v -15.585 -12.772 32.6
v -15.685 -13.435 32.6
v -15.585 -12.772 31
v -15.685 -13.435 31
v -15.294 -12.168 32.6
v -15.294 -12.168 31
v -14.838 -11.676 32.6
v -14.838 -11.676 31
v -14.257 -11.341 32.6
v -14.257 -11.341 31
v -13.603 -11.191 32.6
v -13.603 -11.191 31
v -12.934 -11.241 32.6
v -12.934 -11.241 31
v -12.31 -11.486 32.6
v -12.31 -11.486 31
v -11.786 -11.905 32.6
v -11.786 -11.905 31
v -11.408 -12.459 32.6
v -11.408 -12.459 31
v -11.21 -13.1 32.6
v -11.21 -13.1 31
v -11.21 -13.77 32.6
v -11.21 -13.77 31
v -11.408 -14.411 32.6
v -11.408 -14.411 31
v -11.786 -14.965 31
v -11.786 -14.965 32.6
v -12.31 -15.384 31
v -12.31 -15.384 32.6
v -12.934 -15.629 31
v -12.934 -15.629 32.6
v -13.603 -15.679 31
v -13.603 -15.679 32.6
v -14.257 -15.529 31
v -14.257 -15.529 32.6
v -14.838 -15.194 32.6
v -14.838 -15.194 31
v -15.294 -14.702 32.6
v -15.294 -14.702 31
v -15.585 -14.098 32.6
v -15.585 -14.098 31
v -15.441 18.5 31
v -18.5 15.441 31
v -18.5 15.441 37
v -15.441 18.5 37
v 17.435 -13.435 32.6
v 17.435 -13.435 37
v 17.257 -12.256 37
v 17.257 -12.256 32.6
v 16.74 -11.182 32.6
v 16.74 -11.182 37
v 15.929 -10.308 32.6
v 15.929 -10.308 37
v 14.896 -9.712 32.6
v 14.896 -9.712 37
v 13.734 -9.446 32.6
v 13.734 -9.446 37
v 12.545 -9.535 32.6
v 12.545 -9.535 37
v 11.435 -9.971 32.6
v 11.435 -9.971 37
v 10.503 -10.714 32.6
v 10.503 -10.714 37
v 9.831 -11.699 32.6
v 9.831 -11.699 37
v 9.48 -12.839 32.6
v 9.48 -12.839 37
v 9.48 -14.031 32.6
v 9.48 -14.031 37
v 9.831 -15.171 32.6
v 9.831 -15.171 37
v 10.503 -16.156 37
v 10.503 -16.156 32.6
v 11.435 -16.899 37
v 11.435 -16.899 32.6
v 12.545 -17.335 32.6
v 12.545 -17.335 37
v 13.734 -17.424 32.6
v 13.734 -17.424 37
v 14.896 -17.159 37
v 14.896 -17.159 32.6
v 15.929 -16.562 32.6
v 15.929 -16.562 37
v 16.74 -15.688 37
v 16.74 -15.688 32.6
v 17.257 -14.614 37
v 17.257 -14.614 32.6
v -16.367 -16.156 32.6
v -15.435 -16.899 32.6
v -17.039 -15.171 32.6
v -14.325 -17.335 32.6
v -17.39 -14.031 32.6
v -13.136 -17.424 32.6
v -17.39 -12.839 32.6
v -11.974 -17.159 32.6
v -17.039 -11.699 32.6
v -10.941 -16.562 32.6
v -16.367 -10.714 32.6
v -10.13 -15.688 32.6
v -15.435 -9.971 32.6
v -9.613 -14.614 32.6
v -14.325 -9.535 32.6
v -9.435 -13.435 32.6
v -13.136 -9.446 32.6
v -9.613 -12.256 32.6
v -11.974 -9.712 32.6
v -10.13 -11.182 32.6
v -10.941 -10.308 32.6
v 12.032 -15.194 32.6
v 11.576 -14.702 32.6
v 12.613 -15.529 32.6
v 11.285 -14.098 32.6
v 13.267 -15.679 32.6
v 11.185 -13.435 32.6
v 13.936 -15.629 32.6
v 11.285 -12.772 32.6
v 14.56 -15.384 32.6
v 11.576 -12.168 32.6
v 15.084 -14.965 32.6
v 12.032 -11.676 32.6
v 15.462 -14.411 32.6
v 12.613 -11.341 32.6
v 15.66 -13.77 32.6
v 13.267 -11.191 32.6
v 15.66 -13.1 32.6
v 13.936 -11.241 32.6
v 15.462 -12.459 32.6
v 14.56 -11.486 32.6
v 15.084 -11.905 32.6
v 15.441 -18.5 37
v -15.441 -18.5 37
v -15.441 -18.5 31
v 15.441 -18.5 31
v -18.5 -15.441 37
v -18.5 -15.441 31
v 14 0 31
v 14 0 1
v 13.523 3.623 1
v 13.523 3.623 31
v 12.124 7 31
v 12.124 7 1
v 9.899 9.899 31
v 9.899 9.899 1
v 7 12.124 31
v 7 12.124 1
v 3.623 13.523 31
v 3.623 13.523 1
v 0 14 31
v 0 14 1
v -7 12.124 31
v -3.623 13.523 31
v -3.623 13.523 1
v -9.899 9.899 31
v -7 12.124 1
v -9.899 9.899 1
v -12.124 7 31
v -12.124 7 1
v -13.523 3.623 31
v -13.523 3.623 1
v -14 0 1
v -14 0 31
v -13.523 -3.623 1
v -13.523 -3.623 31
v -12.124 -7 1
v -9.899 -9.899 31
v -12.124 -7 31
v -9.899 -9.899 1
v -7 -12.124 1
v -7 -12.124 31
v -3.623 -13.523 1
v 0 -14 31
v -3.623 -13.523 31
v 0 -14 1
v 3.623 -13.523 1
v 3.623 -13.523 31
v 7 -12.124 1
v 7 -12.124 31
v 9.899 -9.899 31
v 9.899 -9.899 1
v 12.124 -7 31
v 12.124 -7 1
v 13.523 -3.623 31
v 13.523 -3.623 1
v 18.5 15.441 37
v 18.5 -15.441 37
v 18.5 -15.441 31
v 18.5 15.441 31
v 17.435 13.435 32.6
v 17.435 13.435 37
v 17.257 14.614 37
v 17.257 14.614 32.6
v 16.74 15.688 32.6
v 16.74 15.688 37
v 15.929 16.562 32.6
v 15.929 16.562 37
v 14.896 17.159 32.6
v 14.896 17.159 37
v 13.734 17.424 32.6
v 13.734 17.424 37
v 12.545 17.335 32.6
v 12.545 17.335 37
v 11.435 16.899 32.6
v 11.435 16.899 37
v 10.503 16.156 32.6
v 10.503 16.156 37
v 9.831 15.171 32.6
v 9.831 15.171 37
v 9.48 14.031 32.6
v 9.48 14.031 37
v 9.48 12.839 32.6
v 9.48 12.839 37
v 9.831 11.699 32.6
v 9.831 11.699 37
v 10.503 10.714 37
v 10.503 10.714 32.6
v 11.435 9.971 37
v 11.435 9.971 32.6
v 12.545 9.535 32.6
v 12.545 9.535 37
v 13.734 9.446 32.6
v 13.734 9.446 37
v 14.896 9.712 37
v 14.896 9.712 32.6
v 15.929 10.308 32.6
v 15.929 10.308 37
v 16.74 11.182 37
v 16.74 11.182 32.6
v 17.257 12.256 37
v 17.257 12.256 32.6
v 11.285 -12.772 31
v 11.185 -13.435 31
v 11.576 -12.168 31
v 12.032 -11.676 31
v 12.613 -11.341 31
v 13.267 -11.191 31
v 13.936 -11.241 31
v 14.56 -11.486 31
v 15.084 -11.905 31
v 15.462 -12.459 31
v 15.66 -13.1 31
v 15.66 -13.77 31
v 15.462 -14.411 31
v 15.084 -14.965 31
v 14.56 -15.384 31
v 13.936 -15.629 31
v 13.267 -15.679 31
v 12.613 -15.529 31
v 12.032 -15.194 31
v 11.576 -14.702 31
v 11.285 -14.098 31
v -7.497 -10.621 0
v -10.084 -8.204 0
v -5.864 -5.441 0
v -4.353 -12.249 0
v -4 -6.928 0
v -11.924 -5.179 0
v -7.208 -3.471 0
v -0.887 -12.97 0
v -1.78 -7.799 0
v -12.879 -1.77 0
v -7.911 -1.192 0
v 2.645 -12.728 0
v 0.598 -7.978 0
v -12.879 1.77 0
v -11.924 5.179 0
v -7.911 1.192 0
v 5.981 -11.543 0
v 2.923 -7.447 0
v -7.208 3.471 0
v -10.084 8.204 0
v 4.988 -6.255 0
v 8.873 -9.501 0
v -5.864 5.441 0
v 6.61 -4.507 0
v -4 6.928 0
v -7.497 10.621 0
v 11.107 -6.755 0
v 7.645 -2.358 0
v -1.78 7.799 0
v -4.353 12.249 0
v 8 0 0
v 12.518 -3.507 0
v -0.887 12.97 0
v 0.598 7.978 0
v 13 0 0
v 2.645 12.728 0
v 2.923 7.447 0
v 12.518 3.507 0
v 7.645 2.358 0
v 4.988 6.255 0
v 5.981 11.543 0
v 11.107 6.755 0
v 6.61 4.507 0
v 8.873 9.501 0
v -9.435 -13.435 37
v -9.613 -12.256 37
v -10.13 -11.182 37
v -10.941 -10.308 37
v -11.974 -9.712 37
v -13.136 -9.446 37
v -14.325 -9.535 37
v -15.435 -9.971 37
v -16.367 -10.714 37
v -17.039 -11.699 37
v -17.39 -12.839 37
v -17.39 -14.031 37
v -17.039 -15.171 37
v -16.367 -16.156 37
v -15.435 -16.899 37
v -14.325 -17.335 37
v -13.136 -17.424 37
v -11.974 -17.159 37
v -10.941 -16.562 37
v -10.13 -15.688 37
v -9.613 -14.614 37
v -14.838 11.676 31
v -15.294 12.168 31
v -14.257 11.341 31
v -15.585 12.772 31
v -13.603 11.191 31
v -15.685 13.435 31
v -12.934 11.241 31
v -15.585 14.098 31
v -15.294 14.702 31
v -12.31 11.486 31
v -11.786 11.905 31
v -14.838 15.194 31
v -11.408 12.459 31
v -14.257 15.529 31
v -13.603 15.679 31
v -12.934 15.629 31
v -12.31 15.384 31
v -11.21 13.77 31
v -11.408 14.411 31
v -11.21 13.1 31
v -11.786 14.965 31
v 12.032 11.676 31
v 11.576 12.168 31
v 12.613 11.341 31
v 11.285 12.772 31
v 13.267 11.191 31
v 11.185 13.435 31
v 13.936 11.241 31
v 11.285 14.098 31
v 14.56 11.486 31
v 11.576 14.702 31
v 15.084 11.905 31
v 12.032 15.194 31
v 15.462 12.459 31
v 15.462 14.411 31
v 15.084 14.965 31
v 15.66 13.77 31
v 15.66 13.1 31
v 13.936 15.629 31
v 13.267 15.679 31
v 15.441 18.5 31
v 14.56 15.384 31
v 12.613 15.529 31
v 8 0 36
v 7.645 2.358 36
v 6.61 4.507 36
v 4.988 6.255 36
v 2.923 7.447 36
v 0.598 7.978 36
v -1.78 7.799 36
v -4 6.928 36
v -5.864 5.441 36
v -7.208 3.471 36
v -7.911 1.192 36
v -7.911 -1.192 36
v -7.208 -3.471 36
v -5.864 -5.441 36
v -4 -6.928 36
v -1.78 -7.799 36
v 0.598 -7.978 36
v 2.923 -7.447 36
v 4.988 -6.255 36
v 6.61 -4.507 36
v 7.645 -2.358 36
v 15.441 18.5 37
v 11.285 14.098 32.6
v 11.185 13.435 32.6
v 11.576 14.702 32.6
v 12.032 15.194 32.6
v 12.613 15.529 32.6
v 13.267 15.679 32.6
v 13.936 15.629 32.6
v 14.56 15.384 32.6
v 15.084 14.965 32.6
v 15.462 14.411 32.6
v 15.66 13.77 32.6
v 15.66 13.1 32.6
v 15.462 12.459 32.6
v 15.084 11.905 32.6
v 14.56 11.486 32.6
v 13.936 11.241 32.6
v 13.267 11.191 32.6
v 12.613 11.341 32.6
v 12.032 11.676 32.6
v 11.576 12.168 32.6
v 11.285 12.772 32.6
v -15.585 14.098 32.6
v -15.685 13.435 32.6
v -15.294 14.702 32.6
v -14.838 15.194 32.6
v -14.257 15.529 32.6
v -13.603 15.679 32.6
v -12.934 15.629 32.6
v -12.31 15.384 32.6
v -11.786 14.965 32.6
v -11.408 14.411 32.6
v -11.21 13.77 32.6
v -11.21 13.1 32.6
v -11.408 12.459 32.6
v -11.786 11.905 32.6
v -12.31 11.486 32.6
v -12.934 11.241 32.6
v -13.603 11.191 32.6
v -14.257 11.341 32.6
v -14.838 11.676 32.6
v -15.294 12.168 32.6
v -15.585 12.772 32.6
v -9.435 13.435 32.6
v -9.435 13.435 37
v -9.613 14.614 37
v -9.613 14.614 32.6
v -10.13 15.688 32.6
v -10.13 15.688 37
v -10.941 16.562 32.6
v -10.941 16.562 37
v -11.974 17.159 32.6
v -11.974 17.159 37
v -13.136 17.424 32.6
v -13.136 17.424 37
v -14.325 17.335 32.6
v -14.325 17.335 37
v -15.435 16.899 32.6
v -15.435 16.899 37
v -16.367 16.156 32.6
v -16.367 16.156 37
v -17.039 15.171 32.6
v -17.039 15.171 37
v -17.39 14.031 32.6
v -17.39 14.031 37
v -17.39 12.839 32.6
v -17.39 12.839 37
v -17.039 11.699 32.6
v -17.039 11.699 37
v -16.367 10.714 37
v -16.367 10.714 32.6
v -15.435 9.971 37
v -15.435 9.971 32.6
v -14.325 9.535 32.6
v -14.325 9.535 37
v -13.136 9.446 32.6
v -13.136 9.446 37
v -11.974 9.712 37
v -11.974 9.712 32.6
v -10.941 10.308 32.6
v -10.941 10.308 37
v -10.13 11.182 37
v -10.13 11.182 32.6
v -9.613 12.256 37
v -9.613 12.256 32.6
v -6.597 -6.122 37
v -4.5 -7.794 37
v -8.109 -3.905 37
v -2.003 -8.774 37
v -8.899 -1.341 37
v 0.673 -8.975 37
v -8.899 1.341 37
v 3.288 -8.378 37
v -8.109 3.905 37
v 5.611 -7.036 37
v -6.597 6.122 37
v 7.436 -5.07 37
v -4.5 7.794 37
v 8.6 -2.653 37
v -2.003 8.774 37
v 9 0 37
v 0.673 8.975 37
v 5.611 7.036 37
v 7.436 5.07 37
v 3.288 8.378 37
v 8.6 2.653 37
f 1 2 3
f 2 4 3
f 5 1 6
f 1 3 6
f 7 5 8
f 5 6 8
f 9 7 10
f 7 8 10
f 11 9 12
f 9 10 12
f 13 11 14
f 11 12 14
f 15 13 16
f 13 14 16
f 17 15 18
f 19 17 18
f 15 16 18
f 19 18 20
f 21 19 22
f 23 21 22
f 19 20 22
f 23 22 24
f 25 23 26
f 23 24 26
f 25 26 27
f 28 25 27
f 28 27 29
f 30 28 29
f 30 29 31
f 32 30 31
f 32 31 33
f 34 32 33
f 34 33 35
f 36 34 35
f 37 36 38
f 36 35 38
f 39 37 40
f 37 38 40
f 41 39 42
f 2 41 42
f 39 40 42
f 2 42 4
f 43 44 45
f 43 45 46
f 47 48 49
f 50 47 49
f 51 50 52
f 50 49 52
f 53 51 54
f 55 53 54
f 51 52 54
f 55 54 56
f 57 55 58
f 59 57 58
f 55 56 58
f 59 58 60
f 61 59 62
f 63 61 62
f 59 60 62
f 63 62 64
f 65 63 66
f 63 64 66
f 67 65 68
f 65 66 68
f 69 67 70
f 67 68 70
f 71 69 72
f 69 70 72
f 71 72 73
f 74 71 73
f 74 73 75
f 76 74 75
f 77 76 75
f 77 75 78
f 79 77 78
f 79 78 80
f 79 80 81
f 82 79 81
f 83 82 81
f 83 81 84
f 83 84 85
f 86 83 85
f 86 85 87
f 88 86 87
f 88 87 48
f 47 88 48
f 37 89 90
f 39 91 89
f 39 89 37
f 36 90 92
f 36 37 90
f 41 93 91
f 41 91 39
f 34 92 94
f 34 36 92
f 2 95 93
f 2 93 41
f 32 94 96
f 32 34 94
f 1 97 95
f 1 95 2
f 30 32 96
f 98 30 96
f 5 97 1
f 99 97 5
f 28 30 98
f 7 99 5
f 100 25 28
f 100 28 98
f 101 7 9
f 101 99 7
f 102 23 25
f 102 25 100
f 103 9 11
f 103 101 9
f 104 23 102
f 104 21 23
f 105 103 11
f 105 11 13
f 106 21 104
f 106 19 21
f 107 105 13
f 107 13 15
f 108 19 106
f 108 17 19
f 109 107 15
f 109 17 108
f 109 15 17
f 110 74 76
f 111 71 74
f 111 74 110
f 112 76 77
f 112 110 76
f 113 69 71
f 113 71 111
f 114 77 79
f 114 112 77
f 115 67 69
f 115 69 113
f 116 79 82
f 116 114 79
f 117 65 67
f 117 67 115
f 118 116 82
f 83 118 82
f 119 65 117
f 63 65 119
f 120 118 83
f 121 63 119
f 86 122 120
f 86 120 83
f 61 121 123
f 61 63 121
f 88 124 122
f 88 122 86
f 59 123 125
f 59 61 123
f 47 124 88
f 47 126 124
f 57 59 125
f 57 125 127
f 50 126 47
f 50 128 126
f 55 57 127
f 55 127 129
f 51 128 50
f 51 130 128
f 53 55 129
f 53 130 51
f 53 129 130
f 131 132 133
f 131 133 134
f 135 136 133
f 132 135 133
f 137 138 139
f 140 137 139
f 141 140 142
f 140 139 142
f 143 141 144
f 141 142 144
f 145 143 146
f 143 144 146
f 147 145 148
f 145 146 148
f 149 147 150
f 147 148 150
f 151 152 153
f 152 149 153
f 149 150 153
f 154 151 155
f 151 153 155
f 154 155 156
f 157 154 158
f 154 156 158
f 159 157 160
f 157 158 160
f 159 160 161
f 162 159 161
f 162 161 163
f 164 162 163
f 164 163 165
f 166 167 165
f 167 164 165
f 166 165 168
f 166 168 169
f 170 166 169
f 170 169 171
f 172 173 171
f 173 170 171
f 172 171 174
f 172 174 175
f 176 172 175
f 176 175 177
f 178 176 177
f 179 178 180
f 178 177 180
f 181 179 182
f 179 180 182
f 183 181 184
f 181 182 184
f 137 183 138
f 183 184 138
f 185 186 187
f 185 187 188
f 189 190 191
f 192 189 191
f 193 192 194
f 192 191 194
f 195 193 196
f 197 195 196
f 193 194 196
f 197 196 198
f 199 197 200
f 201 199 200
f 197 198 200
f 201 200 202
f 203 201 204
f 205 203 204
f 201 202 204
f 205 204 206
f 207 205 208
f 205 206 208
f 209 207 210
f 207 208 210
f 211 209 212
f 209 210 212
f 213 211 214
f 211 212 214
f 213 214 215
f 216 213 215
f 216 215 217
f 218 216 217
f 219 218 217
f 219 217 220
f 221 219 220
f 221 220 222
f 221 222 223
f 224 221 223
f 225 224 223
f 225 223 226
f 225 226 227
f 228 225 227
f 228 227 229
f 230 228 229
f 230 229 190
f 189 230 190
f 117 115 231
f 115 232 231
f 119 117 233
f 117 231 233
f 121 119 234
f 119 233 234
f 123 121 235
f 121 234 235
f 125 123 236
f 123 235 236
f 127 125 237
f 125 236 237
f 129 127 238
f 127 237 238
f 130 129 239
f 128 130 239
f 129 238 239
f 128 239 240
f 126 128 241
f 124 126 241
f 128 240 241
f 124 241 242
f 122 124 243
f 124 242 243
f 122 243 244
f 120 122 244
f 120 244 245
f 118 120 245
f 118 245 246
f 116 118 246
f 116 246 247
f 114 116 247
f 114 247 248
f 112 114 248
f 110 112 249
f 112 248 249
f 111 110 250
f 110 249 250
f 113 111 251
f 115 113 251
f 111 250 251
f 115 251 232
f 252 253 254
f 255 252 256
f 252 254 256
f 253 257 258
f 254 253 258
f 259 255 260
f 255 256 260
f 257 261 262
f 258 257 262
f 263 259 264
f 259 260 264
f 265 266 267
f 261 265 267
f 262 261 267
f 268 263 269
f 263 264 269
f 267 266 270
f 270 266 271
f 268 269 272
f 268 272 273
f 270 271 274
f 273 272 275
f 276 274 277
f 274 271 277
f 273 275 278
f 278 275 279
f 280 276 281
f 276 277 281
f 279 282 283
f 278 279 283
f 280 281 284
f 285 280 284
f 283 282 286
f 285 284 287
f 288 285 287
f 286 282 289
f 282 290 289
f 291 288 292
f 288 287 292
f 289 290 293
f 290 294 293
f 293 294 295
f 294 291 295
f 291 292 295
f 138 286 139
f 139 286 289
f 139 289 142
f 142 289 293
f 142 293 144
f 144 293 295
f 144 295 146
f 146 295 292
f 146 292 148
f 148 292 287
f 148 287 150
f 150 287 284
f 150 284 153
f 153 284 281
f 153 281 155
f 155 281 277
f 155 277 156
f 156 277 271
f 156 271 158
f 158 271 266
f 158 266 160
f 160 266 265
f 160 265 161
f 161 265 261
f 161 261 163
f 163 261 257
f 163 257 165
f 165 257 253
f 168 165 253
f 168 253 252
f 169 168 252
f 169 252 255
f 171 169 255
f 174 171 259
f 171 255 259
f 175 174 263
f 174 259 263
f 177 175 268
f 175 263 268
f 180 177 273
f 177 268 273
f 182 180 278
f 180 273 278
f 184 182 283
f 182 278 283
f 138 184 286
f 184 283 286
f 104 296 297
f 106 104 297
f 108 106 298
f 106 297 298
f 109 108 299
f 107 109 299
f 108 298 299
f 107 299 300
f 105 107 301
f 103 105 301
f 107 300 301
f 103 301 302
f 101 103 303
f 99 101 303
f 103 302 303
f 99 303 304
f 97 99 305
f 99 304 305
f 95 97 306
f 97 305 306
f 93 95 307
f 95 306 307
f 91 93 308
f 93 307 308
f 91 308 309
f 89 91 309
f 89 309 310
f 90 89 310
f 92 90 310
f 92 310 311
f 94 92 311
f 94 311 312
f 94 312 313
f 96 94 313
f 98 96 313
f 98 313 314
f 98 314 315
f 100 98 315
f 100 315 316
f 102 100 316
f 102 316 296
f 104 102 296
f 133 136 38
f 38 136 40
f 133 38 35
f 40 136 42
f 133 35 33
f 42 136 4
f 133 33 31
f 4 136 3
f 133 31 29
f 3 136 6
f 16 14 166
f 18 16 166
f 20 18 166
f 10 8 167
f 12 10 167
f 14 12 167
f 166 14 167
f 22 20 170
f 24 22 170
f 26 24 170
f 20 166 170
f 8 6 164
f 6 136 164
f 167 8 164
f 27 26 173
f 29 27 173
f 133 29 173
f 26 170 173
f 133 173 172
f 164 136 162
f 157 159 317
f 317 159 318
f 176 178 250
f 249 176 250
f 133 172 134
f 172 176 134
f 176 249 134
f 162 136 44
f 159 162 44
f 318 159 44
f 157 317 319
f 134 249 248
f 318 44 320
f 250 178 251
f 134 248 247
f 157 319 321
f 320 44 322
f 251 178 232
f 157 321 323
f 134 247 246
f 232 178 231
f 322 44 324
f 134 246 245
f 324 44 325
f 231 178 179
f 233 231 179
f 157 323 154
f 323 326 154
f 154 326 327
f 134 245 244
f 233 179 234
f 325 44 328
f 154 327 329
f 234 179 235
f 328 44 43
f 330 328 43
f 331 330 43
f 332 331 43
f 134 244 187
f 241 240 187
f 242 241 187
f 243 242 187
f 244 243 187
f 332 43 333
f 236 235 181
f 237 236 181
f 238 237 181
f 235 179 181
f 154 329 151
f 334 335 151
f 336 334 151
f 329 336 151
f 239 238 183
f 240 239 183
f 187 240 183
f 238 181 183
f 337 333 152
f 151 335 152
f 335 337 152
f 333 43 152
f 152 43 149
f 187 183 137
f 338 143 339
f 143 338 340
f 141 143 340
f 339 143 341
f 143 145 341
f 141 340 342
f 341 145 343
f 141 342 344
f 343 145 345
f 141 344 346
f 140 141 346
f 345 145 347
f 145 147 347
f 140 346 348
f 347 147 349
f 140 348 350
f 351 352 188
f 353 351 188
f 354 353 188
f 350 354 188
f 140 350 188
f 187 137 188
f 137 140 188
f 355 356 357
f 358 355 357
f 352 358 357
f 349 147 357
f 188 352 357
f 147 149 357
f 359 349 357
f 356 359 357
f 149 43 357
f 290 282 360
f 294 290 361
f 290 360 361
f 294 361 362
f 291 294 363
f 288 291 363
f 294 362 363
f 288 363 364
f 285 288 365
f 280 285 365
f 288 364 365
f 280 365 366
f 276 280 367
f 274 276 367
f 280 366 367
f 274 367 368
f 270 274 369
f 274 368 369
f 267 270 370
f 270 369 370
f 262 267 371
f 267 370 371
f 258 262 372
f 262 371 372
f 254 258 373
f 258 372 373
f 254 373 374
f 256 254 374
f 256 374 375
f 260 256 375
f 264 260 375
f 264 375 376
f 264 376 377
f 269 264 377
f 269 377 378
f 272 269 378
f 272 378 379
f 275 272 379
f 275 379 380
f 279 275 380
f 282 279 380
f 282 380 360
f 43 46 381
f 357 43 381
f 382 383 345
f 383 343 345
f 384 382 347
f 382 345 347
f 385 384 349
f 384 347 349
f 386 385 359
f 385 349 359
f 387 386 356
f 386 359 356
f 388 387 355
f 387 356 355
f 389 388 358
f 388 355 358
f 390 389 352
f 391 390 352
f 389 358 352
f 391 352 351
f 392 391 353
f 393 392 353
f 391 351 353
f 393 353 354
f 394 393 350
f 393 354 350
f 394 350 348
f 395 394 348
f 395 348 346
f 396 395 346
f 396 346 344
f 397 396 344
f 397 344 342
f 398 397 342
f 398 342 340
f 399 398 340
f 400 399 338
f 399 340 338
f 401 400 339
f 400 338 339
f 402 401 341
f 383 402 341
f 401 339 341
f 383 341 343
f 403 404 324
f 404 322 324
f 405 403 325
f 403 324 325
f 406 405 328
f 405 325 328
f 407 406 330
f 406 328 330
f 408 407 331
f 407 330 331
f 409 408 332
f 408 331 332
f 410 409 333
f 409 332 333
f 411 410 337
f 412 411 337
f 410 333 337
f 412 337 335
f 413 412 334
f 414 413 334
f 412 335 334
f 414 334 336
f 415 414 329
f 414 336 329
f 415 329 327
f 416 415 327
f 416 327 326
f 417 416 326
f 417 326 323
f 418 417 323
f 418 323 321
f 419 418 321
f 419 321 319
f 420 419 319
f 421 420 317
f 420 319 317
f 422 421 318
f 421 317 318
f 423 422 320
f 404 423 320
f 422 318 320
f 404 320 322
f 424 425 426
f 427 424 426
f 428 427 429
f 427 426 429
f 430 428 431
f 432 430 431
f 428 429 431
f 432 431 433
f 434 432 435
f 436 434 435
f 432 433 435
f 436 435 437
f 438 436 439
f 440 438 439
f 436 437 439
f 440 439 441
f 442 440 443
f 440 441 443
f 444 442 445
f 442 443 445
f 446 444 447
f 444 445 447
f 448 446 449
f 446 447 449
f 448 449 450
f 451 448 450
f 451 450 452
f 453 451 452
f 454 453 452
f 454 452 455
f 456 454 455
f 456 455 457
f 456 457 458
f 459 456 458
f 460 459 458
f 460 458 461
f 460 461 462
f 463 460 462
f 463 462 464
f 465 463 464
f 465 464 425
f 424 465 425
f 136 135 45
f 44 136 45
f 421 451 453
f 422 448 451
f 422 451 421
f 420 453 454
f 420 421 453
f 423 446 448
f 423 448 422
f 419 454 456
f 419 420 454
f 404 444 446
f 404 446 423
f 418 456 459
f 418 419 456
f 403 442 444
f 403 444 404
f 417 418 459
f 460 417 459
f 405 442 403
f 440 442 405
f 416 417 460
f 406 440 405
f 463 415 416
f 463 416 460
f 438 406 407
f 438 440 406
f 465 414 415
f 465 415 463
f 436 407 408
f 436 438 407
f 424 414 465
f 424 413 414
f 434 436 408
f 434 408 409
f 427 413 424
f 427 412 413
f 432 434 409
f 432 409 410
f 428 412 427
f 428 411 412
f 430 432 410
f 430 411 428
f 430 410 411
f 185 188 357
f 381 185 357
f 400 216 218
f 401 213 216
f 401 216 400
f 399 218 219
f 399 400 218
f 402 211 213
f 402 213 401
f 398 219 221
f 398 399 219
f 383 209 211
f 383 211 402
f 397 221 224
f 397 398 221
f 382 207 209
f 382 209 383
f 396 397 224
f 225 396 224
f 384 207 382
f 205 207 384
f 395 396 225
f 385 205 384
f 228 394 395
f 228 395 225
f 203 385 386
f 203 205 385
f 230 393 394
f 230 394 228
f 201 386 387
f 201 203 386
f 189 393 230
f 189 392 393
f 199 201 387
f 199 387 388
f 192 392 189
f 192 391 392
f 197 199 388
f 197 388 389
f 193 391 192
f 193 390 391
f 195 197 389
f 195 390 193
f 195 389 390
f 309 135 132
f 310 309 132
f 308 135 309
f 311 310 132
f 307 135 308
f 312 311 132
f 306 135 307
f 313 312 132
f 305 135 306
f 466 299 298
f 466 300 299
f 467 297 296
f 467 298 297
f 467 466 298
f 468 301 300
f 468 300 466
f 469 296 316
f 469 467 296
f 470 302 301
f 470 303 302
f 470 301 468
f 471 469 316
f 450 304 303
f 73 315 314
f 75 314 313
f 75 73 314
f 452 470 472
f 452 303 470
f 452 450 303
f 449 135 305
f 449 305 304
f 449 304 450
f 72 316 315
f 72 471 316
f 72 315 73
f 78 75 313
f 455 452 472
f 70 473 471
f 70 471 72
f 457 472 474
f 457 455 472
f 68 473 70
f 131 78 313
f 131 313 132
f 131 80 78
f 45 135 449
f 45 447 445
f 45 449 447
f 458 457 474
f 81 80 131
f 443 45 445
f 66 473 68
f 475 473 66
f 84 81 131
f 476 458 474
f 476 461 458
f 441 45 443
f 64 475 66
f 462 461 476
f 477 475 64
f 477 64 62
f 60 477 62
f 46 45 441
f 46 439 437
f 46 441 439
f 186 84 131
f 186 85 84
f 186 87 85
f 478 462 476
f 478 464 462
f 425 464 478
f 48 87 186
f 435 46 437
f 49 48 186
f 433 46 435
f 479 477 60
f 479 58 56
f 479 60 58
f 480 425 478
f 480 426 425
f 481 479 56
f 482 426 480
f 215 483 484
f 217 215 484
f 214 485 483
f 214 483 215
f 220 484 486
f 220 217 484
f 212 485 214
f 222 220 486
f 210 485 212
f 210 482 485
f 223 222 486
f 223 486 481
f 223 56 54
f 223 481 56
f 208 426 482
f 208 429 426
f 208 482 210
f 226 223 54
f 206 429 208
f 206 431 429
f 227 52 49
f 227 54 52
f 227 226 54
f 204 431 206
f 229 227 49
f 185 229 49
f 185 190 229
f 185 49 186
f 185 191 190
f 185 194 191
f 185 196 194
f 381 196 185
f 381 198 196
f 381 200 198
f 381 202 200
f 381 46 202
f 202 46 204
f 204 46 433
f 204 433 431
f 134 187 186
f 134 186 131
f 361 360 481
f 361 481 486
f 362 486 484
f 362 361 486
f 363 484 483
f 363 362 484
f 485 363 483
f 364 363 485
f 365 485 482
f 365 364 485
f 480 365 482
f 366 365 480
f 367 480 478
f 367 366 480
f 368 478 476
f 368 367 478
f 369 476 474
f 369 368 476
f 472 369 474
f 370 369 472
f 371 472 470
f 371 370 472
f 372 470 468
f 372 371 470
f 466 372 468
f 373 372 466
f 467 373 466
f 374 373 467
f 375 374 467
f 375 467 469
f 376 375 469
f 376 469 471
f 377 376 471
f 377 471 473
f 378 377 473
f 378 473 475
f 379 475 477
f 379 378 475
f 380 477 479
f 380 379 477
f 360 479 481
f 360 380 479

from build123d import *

# Parameters (mm, degrees)
SKETCH1_R                                           = 14
BOSS_EXTRUDE1_DEPTH                                 = 37
SKETCH2_W                                           = 37
SKETCH2_H                                           = 37
BOSS_EXTRUDE2_DEPTH                                 = 6
CUT_EXTRUDE1_DEPTH                                  = 46.315560241
CBORE_FOR_M4_HEX_SOCKET_HEAD_CAP_SCREW1_D           = 4.5
CBORE_FOR_M4_HEX_SOCKET_HEAD_CAP_SCREW1_DEPTH       = 22
CBORE_FOR_M4_HEX_SOCKET_HEAD_CAP_SCREW1_CBORE_D     = 8
CBORE_FOR_M4_HEX_SOCKET_HEAD_CAP_SCREW1_CBORE_DEPTH = 4.4
CBORE_FOR_M4_HEX_SOCKET_HEAD_CAP_SCREW1_TIP         = 1.351936393
SKETCH8_R                                           = 8
CUT_EXTRUDE2_DEPTH                                  = 46.315560241
CHAMFER1_SIZE                                       = 1


with BuildPart() as part:
    # Sketch1 → Boss-Extrude1 (new body)
    with BuildSketch(Plane.XY):
        Circle(SKETCH1_R)
    extrude(amount=BOSS_EXTRUDE1_DEPTH)

    # Sketch2 → Boss-Extrude2 (add)
    with BuildSketch(Plane.XY.offset(37)):
        Rectangle(SKETCH2_W, SKETCH2_H)
    extrude(amount=-BOSS_EXTRUDE2_DEPTH)

    # Sketch4 → Cut-Extrude1 (cut, through all)
    with BuildSketch(Plane.XY.offset(37)):
        Polygon((-18.5, 18.5), (-18.5, 15.441125497), (-15.441125497, 18.5), align=None)
        Polygon((15.441125497, 18.5), (18.5, 18.5), (18.5, 15.441125497), align=None)
        Polygon((18.5, -18.5), (18.5, -15.441125497), (15.441125497, -18.5), align=None)
        Polygon((-15.441125497, -18.5), (-18.5, -18.5), (-18.5, -15.441125497), align=None)
    extrude(amount=-CUT_EXTRUDE1_DEPTH, mode=Mode.SUBTRACT)

    # CBORE for M4 Hex Socket Head Cap Screw1
    with Locations(Plane.XY.offset(37)):
        with Locations((-13.435028843, 13.435028843), (13.435028843, 13.435028843), (13.435028843, -13.435028843), (-13.435028843, -13.435028843)):
            CounterBoreHole(CBORE_FOR_M4_HEX_SOCKET_HEAD_CAP_SCREW1_D / 2, CBORE_FOR_M4_HEX_SOCKET_HEAD_CAP_SCREW1_CBORE_D / 2, CBORE_FOR_M4_HEX_SOCKET_HEAD_CAP_SCREW1_CBORE_DEPTH, depth=CBORE_FOR_M4_HEX_SOCKET_HEAD_CAP_SCREW1_DEPTH)
            with Locations((0, 0, -(CBORE_FOR_M4_HEX_SOCKET_HEAD_CAP_SCREW1_DEPTH + CBORE_FOR_M4_HEX_SOCKET_HEAD_CAP_SCREW1_TIP / 2))):  # 118° drill point
                Cone(0, CBORE_FOR_M4_HEX_SOCKET_HEAD_CAP_SCREW1_D / 2, CBORE_FOR_M4_HEX_SOCKET_HEAD_CAP_SCREW1_TIP, mode=Mode.SUBTRACT)

    # Sketch8 → Cut-Extrude2 (cut, through all)
    with BuildSketch(Plane.XY.offset(37)):
        Circle(SKETCH8_R)
    extrude(amount=-CUT_EXTRUDE2_DEPTH, mode=Mode.SUBTRACT)

    # Chamfer1
    chamfer1_edges = [part.edges().sort_by_distance(p)[0] for p in [
        (-8, 0, 37),
        (-14, 0, 0),
    ]]
    chamfer(chamfer1_edges, length=CHAMFER1_SIZE)


solid = part.part
